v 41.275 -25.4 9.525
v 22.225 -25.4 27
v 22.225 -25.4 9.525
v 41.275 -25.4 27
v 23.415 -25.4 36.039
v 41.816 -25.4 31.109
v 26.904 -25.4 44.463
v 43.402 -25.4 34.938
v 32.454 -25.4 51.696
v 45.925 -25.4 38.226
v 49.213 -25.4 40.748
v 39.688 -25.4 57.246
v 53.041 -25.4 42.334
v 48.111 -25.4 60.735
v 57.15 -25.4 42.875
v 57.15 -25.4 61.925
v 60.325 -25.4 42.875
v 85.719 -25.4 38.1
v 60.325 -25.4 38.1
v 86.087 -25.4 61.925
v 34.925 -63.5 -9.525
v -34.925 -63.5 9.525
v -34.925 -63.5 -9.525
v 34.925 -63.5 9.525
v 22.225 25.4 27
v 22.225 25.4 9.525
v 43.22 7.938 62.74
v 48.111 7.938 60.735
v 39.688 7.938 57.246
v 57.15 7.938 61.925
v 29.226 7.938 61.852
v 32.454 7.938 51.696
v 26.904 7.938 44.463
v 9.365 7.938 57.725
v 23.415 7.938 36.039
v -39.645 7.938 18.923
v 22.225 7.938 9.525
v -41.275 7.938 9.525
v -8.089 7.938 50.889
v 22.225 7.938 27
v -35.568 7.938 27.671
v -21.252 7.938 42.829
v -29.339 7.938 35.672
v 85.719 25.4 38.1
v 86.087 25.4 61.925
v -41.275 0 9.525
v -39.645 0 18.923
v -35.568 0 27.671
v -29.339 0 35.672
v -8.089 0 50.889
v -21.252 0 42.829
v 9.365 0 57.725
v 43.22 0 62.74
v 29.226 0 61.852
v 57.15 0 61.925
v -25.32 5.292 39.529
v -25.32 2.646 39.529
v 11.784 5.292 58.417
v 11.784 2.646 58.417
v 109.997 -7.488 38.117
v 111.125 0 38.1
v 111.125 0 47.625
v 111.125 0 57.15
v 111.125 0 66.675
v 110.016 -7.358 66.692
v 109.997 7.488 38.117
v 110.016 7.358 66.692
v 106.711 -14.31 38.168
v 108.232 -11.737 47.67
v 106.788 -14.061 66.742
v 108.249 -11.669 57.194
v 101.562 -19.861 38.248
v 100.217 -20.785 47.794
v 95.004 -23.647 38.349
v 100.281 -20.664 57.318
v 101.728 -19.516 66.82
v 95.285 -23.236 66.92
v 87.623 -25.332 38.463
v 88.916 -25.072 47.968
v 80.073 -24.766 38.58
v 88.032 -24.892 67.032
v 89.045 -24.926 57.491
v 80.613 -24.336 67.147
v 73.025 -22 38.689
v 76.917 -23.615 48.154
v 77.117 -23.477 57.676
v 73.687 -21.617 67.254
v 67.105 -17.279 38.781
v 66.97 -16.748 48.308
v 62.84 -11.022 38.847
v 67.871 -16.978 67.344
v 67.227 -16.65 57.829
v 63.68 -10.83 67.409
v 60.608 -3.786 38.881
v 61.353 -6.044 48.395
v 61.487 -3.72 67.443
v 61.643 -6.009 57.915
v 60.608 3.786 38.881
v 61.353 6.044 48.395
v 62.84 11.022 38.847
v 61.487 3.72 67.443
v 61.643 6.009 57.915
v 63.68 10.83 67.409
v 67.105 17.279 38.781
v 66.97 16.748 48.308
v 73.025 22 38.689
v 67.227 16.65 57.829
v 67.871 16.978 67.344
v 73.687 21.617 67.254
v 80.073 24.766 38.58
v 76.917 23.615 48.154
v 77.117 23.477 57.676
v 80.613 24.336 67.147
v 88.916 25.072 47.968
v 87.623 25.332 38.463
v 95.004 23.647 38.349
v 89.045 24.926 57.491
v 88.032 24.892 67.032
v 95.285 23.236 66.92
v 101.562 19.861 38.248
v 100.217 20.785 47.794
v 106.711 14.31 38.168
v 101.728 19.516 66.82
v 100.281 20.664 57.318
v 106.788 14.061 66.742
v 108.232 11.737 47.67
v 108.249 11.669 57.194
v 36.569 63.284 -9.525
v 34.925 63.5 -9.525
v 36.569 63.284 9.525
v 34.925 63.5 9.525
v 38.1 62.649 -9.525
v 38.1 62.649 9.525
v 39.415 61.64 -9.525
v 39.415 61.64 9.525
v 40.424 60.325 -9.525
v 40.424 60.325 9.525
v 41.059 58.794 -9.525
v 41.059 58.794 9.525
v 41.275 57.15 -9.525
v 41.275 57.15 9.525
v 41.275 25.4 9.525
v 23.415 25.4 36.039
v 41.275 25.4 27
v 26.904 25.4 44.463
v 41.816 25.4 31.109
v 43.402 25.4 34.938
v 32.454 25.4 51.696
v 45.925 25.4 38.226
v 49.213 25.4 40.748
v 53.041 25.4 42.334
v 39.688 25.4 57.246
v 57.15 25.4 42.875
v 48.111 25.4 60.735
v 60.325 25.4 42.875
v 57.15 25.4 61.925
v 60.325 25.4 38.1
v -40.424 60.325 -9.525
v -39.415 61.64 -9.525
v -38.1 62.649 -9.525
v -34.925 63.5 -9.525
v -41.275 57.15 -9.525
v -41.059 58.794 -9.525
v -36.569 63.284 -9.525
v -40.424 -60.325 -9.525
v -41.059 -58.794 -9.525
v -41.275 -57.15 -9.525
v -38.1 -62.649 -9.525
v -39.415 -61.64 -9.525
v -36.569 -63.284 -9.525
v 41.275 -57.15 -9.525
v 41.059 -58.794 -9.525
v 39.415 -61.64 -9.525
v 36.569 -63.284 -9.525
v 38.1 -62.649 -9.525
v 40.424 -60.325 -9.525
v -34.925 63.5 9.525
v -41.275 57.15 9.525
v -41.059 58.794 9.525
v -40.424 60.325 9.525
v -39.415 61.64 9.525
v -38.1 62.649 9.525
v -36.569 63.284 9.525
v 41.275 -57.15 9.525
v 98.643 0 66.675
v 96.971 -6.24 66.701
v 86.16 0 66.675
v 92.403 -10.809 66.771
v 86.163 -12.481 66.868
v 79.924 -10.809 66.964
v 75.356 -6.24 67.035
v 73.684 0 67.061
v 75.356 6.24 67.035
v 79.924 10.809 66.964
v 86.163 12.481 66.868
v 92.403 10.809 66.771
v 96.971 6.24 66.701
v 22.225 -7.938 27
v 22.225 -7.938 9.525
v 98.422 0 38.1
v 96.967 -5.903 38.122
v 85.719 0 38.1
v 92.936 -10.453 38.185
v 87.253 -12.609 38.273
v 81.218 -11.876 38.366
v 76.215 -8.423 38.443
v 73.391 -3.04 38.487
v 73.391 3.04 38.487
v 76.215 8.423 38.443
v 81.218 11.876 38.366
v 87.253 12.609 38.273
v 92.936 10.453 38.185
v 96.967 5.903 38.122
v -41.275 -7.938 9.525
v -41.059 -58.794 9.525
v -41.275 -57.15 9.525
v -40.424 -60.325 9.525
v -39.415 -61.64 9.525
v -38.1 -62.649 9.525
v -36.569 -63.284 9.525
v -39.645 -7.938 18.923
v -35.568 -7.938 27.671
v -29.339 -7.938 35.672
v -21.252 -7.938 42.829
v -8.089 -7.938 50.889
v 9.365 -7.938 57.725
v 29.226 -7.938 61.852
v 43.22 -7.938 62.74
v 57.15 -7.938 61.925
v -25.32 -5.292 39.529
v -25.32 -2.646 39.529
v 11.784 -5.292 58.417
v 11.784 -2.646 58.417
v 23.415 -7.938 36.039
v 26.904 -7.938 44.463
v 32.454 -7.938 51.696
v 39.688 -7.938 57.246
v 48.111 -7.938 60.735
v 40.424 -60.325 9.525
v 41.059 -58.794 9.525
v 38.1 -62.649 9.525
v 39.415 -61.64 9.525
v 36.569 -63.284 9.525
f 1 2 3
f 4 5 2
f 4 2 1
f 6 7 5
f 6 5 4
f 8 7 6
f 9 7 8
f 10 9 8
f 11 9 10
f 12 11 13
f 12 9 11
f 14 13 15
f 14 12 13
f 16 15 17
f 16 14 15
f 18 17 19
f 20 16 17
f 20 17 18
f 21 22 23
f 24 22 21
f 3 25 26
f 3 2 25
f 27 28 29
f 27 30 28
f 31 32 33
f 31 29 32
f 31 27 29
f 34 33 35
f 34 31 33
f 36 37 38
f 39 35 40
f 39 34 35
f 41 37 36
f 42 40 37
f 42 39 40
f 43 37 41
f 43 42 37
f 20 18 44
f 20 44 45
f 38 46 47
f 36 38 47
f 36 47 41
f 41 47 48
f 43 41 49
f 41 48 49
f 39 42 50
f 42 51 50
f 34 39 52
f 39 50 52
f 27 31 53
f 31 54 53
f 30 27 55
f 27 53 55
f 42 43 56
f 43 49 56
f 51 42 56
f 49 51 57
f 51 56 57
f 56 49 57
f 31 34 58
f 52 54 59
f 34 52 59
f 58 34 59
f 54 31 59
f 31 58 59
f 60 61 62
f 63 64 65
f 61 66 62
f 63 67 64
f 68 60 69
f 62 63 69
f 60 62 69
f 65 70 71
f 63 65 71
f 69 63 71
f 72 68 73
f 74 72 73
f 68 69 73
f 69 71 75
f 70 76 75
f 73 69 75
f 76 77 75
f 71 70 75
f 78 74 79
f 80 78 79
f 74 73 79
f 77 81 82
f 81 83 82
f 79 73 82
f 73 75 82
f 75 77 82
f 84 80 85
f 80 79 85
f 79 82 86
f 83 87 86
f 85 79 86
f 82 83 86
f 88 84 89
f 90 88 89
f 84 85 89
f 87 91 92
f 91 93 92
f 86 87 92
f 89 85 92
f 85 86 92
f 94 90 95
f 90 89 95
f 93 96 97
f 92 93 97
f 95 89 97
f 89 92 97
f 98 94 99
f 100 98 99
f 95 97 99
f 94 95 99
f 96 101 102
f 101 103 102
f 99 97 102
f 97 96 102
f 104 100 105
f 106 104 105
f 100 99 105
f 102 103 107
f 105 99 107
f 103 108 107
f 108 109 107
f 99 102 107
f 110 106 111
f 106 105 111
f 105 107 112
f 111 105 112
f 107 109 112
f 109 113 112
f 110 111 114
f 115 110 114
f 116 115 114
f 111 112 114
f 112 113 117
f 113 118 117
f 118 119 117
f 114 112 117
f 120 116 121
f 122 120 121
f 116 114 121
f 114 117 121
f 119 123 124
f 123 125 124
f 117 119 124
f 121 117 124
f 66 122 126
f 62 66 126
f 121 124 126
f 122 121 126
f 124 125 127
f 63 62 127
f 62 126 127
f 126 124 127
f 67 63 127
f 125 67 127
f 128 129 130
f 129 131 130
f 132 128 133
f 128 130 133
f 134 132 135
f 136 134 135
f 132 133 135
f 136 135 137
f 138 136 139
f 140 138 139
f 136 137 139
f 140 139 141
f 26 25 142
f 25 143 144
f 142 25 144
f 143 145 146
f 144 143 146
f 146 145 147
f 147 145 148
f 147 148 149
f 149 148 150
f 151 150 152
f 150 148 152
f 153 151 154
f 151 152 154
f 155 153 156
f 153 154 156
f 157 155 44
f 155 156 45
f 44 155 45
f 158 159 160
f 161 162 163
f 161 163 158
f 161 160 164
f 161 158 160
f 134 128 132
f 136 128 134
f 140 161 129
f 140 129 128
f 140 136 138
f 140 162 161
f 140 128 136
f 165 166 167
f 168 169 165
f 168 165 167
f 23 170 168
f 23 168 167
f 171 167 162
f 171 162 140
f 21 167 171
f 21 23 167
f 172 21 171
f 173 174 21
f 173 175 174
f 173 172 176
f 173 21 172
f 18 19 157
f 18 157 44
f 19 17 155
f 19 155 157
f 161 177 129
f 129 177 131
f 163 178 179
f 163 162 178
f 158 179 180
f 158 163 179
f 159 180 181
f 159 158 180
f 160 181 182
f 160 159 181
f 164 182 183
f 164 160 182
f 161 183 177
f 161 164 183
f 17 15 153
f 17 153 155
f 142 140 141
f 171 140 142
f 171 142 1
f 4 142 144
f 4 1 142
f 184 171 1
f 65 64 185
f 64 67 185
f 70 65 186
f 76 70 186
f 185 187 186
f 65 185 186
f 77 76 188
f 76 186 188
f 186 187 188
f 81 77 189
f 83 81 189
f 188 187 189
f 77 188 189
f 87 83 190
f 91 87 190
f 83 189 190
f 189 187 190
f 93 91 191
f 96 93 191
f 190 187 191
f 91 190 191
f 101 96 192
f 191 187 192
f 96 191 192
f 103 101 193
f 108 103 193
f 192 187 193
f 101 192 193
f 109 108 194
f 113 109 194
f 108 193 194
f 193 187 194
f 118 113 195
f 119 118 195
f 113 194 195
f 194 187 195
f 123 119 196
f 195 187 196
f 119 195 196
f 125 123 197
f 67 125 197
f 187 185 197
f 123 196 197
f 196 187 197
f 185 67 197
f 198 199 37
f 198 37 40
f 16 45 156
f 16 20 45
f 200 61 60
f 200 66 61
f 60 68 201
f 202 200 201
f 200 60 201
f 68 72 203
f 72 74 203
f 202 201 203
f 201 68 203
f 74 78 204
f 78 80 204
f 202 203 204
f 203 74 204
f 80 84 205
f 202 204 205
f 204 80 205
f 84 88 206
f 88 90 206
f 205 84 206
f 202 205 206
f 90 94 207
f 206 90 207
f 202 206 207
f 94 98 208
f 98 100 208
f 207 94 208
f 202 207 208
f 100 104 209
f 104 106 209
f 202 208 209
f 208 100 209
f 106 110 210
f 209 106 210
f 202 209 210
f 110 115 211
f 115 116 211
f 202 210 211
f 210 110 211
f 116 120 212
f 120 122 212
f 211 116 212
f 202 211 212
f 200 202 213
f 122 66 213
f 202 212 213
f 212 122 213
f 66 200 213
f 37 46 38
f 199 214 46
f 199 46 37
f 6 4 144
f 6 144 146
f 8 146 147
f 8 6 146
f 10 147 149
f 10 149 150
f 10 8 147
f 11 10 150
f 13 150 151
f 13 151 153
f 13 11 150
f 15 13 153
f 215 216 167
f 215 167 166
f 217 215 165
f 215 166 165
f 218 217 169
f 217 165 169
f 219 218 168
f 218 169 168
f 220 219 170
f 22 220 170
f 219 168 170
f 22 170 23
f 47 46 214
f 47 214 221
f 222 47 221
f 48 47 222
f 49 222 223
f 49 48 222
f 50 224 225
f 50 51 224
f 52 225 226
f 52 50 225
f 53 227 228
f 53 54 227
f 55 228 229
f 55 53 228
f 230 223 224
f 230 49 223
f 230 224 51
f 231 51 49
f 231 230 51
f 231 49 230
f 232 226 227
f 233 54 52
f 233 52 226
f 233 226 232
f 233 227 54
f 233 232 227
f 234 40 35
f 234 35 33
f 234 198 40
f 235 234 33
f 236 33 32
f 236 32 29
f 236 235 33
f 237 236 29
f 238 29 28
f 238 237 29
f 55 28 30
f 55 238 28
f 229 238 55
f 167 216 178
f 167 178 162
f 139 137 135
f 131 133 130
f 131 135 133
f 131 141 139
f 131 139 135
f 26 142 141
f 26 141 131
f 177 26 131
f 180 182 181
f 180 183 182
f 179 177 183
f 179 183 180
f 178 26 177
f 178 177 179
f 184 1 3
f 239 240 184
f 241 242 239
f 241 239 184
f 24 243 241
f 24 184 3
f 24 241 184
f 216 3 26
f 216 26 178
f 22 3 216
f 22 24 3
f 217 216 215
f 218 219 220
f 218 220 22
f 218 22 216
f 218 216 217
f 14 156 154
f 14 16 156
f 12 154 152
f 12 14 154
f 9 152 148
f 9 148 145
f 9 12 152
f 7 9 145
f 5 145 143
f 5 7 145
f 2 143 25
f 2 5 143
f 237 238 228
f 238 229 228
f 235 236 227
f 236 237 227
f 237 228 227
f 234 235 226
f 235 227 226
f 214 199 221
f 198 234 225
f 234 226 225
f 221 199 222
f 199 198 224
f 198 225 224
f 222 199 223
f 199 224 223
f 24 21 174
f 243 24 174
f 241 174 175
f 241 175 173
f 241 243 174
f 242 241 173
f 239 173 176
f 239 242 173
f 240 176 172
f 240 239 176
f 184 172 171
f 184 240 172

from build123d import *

# Parameters (mm, degrees)
F1_DEPTH = 63.5
F2_DEPTH = 25.4
F3_DEPTH = 7.9375
F5_R     = 6.35


with BuildPart() as f1:
    # F0 (on Front) → F1 (new body, symmetric)
    with BuildSketch(Plane.XZ):
        Polygon((22.225, 9.525), (-41.275, 9.525), (-41.275, -9.525), (41.275, -9.525), (41.275, 9.525), align=None)
    extrude(amount=F1_DEPTH, both=True)

    # F0 (on Front) → F2 (join, symmetric)
    with BuildSketch(Plane.XZ):
        with BuildLine():
            Line((22.225, 27.0002), (22.225, 9.525))
            Line((22.225, 9.525), (41.275, 9.525))
            Line((41.275, 9.525), (41.275, 27.0002))
            ThreePointArc((41.275, 27.0002), (45.9246798487, 38.2255201513), (57.15, 42.8752))
            Line((57.15, 42.8752), (60.325, 42.8752))
            Line((60.325, 42.8752), (60.325, 61.9252))
            Line((60.325, 61.9252), (57.15, 61.9252))
            ThreePointArc((57.15, 61.9252), (32.4542956671, 51.6959043329), (22.225, 27.0002))
        make_face()
        Polygon((86.0870358149, 61.9252), (60.325, 61.9252), (60.325, 42.8752), (60.325, 38.1), (85.7186317444, 38.1), align=None)
    extrude(amount=F2_DEPTH, both=True)

    # F5
    f5_edges = [f1.edges().sort_by_distance(p)[0] for p in [
        (41.275, -63.5, 0),
        (-41.275, -63.5, 0),
        (41.275, 63.5, 0),
        (-41.275, 63.5, 0),
    ]]
    fillet(f5_edges, radius=F5_R)


with BuildPart() as f3:
    # F0 (on Front) → F3 (new body, symmetric)
    with BuildSketch(Plane.XZ):
        with BuildLine():
            add(Edge.make_bspline(
                [(-41.275, 9.525), (-40.1892624795, 43.6672493815), (11.9488732889, 67.5270706415), (57.15, 61.9252)],
                knots=[0, 0, 0, 0, 111.5045361635, 111.5045361635, 111.5045361635, 111.5045361635], degree=3))
            Line((-41.275, 9.525), (22.225, 9.525))
            Line((22.225, 9.525), (22.225, 27.0002))
            ThreePointArc((22.225, 27.0002), (32.4542956671, 51.6959043329), (57.15, 61.9252))
        make_face()
    extrude(amount=F3_DEPTH, both=True)


with BuildPart() as f4:
    # F0 (on Front) → F4 (revolve)
    with BuildSketch(Plane.XZ):
        Polygon((86.1604809761, 66.675), (86.0870358149, 61.9252), (85.7186317444, 38.1), (111.125, 38.1), (111.125, 66.675), align=None)
    revolve(axis=Axis((85.9395563602, 0, 52.3875), (-0.015460942, 0, -0.9998804725)))


solid = Compound([f1.part, f3.part, f4.part])
